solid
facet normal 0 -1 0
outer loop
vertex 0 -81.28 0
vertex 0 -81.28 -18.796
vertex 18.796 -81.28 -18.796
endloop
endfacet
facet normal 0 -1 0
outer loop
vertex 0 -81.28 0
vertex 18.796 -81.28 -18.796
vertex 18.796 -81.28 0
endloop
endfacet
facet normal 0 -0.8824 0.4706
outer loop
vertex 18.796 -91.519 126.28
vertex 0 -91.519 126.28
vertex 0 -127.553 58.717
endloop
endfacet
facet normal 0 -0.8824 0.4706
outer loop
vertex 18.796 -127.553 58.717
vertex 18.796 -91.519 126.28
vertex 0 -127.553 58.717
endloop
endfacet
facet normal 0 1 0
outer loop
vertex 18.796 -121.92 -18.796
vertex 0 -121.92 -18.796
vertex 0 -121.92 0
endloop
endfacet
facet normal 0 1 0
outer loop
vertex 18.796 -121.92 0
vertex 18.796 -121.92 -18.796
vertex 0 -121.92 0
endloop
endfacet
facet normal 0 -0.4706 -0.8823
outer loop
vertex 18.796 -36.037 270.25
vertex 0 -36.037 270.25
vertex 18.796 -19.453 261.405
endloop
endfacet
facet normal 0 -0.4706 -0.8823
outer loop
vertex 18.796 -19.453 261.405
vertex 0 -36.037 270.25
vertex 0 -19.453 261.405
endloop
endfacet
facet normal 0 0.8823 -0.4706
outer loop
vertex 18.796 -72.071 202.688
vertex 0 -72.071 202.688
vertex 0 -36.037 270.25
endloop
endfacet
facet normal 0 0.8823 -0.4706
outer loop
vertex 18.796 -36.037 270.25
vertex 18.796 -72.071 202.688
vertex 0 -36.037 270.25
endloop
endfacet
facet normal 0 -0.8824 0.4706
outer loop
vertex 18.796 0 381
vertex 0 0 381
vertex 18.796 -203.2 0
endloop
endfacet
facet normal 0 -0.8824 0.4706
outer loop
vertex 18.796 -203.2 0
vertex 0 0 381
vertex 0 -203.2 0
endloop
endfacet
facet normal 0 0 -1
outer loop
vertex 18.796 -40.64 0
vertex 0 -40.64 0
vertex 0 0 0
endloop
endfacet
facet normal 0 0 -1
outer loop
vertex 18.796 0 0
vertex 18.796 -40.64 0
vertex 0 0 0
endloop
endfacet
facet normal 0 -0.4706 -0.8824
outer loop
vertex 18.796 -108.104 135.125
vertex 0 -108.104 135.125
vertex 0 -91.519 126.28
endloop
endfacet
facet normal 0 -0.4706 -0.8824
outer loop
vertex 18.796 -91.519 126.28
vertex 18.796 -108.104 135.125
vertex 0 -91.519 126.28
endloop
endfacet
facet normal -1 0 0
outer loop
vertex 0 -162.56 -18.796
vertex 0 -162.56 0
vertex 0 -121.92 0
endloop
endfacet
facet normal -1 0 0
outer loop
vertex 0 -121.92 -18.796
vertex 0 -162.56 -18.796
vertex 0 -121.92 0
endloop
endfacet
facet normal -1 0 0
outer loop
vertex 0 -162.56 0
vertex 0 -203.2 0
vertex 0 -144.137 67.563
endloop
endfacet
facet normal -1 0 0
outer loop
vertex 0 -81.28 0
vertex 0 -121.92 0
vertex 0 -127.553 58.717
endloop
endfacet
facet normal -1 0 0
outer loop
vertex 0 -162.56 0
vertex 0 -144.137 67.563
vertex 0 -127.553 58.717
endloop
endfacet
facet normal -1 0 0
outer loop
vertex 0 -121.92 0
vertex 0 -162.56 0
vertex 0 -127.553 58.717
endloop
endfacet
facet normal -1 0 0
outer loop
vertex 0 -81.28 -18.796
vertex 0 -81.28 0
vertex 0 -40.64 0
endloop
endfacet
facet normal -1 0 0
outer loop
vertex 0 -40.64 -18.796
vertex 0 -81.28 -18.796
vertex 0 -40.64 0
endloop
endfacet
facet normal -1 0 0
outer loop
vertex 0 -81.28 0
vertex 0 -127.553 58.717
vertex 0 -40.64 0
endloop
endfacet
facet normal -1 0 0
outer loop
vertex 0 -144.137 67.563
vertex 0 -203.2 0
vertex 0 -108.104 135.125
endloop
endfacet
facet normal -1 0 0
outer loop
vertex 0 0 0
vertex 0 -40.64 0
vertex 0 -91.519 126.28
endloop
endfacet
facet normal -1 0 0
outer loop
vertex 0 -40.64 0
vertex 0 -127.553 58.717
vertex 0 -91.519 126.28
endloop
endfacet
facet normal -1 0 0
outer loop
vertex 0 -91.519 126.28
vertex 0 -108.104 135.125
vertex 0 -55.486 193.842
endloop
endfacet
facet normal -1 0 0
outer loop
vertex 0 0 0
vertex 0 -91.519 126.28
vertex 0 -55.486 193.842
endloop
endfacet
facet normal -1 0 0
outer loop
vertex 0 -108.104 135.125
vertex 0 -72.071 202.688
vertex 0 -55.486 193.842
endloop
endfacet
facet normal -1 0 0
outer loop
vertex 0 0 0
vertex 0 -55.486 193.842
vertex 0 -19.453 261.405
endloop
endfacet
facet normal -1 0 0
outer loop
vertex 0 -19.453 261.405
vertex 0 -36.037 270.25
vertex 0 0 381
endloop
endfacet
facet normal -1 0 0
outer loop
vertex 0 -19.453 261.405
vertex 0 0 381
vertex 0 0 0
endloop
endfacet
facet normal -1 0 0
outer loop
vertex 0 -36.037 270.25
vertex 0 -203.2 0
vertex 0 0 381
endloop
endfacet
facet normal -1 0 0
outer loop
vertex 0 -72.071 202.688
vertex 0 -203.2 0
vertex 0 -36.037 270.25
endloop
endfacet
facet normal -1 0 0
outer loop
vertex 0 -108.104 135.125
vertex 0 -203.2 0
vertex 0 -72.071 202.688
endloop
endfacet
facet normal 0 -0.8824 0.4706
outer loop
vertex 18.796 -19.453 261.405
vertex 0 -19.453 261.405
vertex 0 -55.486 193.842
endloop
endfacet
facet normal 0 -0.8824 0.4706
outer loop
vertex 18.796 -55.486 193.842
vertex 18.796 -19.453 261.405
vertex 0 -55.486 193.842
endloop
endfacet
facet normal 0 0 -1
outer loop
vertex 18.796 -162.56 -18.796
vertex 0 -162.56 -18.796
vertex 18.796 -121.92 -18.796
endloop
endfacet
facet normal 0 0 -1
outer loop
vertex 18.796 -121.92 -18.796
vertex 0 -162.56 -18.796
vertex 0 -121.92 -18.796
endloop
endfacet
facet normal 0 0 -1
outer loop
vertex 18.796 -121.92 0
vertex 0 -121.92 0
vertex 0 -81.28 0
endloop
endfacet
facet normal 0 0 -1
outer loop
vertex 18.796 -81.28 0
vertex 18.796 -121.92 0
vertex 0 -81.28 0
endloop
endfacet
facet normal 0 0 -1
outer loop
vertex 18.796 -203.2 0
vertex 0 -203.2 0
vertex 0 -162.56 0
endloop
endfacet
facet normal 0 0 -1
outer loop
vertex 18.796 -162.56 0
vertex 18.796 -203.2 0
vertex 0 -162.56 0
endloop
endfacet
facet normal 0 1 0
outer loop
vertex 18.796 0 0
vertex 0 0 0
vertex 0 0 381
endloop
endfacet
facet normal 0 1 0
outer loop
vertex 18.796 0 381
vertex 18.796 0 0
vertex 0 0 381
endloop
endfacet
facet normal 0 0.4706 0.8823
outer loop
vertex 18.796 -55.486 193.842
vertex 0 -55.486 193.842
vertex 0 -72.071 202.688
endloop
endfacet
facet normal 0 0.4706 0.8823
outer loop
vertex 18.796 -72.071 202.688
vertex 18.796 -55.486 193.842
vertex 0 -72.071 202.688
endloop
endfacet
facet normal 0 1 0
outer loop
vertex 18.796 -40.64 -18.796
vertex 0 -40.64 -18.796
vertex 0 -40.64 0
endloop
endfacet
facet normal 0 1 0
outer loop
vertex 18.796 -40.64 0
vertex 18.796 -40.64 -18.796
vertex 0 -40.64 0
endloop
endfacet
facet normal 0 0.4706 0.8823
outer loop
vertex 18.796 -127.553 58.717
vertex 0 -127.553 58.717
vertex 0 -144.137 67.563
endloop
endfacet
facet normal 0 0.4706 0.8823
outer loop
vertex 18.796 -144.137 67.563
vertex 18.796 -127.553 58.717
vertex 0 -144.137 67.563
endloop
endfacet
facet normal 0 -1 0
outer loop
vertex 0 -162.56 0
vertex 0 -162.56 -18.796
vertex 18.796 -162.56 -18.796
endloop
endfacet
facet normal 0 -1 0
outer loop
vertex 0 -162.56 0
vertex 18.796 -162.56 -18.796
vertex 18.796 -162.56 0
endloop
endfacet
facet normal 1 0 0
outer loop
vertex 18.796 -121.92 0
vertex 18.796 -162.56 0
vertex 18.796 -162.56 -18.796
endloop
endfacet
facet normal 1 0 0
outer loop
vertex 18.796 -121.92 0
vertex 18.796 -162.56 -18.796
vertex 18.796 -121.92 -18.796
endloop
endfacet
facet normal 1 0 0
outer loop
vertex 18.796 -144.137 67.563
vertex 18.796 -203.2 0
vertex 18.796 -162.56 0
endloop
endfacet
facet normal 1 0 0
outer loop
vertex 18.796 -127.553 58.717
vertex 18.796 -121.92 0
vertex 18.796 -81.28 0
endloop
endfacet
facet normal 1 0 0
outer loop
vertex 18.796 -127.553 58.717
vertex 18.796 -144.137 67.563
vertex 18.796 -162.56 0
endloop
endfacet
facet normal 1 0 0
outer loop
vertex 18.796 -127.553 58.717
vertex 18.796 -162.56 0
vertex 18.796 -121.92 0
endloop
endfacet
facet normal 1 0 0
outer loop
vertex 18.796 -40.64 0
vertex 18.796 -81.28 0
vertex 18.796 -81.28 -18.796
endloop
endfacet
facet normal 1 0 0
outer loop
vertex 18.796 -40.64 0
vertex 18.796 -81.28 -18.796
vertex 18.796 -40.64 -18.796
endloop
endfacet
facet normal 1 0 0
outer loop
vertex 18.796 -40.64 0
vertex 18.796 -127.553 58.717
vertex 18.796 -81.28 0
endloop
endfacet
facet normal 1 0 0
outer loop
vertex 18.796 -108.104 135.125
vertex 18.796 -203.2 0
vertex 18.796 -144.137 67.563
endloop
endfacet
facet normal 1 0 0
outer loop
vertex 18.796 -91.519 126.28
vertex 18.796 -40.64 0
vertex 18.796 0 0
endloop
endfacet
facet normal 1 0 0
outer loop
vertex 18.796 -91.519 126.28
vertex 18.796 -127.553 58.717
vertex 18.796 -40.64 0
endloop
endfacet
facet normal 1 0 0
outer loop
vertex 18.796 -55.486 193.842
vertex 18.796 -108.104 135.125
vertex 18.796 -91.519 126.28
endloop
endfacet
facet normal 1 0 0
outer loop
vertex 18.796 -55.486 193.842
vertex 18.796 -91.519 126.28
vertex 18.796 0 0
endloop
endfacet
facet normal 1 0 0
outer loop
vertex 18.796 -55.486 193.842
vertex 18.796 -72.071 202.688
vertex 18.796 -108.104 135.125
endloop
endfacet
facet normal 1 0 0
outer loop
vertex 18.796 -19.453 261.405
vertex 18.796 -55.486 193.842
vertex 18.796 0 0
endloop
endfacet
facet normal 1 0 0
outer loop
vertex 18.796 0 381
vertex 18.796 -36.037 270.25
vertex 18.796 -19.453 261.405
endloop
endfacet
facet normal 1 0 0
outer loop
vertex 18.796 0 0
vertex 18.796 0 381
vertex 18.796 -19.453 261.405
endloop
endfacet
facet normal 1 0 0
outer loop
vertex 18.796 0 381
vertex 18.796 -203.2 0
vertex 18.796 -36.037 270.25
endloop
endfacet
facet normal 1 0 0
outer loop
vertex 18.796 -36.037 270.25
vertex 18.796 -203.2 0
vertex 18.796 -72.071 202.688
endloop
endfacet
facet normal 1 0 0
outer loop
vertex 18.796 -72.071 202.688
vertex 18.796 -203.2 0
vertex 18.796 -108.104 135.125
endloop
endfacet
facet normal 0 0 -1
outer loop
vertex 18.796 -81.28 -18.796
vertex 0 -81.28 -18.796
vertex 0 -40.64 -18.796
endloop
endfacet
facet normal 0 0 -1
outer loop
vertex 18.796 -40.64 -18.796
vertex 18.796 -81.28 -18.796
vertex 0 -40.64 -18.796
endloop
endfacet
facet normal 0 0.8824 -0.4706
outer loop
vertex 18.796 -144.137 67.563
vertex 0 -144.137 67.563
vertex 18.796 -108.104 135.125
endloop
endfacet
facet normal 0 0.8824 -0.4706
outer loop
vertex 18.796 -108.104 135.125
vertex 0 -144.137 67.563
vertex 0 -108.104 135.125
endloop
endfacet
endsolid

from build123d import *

# Parameters (mm, degrees)
F0_W     = 40.64
F0_H     = 18.796
F1_DEPTH = 18.796


with BuildPart() as f1:
    # F0 (on Right) → F1 (new body)
    with BuildSketch(Plane.YZ):
        Polygon((-40.64, 0), (0, 0), (0, 337.82), (-36.037321, 270.250024), (-19.452615, 261.404847), (-55.485951, 193.842341), (-72.070657, 202.687518), (-108.103994, 135.125012), (-91.519288, 126.279835), (-127.552624, 58.717329), (-144.13733, 67.562506), (-180.170667, 0), (-162.56, 0), (-121.92, 0), (-101.6, 0), (-81.28, 0), align=None)
        Polygon((-36.037321, 270.250024), (0, 337.82), (0, 381), (-203.2, 0), (-180.170667, 0), (-144.13733, 67.562506), (-108.103994, 135.125012), (-72.070657, 202.687518), align=None)
        with Locations((-60.96, -9.398)):
            Rectangle(F0_W, F0_H)
        with Locations((-142.24, -9.398)):
            Rectangle(F0_W, F0_H)
    extrude(amount=F1_DEPTH)


solid = f1.part
